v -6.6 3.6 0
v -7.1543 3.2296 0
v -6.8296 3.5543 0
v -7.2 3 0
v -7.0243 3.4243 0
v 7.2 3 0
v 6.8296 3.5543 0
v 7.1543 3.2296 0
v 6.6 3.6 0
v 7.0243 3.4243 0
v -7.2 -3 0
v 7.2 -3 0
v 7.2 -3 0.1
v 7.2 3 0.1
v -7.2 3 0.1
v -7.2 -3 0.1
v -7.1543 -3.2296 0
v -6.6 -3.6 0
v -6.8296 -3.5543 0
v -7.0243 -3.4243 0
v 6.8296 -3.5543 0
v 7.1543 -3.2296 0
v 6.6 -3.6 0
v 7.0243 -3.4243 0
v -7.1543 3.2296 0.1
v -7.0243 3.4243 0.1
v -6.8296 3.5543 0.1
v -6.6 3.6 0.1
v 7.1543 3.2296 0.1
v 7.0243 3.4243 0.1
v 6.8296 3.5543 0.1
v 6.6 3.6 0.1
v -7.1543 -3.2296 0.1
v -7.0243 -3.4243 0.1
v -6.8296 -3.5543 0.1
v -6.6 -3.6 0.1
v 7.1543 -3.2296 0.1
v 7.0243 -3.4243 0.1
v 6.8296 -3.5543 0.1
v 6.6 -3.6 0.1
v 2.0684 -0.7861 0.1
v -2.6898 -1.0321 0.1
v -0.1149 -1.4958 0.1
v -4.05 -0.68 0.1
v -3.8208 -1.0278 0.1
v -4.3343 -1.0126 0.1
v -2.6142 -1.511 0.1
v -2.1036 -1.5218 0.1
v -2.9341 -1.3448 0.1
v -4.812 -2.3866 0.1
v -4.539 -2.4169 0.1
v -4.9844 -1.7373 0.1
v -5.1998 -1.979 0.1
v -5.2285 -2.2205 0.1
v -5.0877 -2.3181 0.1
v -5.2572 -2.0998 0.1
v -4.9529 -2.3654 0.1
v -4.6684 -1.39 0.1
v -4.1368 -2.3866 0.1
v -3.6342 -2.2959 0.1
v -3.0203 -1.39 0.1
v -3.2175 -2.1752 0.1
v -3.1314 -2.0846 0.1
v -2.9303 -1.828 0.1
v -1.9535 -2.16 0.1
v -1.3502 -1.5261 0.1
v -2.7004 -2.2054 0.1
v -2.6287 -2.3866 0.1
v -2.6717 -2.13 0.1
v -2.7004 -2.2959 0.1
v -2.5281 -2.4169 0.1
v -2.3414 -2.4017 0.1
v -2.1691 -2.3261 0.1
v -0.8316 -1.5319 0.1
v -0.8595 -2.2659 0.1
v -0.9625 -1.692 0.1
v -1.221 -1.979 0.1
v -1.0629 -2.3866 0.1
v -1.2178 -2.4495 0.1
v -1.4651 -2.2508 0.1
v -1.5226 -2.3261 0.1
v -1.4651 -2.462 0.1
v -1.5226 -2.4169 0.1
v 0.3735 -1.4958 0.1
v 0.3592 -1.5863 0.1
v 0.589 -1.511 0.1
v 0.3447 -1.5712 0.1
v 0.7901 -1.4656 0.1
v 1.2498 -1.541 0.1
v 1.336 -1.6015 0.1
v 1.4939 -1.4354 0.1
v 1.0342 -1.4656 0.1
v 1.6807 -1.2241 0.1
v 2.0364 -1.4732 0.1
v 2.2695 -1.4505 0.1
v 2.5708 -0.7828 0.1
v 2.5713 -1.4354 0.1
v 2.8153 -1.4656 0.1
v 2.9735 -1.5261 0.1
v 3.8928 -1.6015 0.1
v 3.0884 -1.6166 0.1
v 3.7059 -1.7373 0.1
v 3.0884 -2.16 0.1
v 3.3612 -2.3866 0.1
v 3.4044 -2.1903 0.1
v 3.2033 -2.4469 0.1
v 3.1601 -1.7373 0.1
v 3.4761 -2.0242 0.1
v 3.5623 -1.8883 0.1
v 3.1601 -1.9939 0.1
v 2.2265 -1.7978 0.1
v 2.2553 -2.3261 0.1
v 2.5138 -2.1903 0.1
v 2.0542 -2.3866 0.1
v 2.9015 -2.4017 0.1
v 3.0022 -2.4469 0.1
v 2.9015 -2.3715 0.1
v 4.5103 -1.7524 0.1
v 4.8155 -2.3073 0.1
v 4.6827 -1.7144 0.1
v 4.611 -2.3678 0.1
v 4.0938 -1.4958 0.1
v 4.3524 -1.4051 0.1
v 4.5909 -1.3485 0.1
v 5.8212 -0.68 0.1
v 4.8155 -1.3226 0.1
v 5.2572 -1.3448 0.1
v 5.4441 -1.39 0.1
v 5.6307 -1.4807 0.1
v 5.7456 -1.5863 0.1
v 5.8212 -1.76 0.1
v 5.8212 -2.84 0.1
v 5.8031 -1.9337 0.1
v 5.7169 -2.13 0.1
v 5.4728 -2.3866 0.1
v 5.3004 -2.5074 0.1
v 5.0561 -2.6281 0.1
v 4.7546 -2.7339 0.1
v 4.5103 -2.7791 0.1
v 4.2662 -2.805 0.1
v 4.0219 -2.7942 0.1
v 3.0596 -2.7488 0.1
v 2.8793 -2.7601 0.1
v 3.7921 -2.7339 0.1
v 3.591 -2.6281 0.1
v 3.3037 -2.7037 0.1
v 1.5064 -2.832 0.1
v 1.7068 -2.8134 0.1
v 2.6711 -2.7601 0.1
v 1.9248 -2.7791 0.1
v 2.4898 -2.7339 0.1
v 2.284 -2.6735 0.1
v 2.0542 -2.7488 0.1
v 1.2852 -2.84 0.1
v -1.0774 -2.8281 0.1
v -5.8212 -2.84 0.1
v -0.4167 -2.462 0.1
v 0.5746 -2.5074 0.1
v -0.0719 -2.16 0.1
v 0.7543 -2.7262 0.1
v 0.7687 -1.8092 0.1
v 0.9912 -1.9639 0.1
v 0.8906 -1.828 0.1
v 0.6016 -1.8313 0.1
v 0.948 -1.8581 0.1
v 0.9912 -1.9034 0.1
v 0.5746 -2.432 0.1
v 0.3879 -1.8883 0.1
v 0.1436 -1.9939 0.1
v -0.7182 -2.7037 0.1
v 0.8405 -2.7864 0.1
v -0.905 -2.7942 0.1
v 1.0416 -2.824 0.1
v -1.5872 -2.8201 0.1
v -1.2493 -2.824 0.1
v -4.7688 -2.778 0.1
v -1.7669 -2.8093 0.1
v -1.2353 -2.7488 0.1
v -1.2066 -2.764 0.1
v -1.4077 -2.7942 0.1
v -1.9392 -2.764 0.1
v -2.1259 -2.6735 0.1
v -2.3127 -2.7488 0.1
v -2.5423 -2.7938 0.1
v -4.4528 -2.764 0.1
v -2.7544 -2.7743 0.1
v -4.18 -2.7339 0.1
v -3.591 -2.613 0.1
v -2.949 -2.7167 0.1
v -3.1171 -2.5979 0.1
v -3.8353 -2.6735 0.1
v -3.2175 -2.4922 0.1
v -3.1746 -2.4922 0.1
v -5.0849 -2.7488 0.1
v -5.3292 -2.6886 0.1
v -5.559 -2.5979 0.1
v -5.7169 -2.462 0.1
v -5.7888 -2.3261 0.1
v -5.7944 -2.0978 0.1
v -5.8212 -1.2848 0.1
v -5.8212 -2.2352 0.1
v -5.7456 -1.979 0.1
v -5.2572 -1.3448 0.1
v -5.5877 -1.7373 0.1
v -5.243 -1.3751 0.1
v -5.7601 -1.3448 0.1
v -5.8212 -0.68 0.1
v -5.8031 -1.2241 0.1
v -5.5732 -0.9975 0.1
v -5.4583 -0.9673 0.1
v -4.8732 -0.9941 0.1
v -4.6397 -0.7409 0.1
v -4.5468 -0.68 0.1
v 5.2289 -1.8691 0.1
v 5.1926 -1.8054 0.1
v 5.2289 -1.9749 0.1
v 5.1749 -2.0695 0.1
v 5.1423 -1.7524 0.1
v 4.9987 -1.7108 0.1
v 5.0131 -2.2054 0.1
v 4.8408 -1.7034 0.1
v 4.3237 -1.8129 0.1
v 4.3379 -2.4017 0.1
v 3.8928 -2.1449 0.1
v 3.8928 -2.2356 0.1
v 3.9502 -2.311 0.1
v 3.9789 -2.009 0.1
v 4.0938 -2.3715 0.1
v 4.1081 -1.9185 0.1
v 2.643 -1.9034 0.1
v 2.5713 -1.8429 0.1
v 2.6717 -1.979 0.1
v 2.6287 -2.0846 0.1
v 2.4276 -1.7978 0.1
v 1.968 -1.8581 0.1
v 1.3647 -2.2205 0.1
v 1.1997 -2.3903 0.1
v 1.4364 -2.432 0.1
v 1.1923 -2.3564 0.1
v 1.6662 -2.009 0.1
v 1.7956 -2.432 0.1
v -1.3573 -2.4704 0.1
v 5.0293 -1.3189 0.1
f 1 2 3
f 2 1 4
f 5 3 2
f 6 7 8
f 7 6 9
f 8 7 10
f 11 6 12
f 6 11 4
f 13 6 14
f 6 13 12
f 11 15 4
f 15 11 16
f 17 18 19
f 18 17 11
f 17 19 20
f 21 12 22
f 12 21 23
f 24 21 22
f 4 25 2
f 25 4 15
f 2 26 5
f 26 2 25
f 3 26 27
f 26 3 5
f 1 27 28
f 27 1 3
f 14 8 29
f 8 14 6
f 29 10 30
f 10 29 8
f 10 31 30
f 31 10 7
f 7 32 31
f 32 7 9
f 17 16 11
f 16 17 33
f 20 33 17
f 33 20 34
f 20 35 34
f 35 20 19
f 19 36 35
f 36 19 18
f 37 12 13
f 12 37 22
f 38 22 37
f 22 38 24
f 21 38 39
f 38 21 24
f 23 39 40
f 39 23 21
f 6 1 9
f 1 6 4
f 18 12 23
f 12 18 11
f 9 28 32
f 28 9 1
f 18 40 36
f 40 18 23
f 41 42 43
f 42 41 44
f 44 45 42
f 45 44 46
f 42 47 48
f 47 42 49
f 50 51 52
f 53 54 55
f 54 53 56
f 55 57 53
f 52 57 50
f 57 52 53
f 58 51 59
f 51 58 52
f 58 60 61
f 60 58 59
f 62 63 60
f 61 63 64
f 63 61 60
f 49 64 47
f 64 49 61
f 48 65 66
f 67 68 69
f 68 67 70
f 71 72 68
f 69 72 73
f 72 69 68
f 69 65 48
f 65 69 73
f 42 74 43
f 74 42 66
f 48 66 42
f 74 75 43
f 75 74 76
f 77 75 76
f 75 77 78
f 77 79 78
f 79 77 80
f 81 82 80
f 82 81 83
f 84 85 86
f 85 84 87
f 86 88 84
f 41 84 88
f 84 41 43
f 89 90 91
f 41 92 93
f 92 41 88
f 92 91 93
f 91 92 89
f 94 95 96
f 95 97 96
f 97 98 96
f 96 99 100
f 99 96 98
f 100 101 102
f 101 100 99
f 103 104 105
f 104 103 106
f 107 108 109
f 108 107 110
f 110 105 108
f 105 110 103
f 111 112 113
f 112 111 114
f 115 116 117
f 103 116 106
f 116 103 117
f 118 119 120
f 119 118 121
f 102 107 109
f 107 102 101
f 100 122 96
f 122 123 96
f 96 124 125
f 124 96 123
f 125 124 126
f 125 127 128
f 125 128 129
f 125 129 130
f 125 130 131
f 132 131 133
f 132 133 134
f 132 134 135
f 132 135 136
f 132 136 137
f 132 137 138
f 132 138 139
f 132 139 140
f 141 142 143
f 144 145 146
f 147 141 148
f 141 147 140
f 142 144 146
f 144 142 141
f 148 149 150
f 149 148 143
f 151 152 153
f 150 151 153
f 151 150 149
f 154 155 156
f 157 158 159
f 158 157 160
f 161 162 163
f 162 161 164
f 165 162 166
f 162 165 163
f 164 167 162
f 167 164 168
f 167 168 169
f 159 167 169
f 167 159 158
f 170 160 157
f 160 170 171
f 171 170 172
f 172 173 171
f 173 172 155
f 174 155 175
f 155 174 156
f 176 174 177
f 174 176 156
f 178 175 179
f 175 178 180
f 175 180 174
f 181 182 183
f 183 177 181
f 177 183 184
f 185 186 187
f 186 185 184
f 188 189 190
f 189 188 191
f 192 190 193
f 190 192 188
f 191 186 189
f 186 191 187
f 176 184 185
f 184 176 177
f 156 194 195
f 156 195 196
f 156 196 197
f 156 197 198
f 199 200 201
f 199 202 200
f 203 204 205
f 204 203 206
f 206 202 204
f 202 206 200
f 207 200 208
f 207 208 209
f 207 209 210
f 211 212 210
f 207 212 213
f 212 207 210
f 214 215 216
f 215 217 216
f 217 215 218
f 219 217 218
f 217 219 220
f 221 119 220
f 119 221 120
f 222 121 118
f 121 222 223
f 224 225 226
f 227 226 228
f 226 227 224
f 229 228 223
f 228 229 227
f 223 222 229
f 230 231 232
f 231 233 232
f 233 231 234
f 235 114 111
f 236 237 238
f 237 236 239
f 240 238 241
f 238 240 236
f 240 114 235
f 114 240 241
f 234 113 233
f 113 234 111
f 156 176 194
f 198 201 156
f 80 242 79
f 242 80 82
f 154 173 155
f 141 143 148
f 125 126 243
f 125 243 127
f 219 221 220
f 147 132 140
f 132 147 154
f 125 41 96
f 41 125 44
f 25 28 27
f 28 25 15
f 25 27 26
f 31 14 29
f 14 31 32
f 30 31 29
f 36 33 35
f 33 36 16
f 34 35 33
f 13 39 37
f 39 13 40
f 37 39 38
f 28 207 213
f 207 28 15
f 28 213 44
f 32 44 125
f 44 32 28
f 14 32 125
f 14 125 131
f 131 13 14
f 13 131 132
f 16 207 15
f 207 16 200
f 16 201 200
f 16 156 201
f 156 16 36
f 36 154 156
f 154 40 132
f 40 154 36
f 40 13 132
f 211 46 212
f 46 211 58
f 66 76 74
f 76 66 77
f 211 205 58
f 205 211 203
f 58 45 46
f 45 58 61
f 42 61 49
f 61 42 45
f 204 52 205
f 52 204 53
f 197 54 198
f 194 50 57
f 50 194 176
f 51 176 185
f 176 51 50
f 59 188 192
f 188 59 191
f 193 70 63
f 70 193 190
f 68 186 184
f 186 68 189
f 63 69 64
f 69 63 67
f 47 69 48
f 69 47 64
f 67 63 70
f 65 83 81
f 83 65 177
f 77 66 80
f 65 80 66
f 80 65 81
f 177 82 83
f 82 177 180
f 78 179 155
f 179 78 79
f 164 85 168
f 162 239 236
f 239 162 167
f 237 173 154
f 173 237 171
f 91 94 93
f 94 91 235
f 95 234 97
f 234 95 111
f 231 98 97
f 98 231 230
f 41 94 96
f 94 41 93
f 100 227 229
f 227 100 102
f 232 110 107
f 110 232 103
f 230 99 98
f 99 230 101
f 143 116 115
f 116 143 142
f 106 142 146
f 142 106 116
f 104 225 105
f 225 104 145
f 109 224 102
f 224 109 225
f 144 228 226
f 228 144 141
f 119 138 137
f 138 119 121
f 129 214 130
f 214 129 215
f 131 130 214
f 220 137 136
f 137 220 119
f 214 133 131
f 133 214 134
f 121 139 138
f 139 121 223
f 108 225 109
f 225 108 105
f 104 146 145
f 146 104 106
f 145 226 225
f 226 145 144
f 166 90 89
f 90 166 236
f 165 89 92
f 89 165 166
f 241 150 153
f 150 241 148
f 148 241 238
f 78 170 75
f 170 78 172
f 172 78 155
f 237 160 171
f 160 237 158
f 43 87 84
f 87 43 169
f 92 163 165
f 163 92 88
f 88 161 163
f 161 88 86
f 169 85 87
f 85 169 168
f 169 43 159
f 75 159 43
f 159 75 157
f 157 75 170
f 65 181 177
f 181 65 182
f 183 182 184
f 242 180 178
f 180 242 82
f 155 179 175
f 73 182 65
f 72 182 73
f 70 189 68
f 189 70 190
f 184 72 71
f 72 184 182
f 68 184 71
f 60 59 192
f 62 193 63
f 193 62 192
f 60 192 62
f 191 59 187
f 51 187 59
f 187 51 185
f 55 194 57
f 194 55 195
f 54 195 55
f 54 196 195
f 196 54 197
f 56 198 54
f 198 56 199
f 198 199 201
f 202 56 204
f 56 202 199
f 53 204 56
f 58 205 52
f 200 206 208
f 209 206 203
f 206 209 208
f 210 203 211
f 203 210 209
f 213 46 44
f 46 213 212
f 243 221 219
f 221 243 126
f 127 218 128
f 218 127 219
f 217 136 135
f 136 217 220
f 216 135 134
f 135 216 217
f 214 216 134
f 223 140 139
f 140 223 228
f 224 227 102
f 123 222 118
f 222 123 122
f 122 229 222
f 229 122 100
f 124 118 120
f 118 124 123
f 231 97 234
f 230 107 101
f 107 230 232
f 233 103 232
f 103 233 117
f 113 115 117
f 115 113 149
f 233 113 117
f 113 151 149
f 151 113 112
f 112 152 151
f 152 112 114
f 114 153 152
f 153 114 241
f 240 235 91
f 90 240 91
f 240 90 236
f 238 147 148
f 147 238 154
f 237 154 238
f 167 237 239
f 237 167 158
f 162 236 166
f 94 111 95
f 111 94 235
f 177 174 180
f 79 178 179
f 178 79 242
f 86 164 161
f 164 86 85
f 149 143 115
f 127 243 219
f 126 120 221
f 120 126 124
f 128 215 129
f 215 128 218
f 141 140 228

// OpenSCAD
use <../lib.scad>
use <../p/logo-porsche-turbo-text.scad>
use <s/6221655xs01.scad>
use <s/stickerback009x018.scad>
function ldraw_lib__6221655x() = [
// 0 Sticker  0.9 x  1.8 with Black "turbo" on Green Background
// 0 Name: 6221655x.dat
// 0 Author: Massimo Maso [Sirio]
// 0 !LDRAW_ORG Part UPDATE 2026-05
// 0 !LICENSE Licensed under CC BY 4.0 : see CAreadme.txt
// 
// 0 BFC CERTIFY CCW
  [0,"BFC","CERTIFY"],
  [0,"BFC","CCW"],
// 
// 0 !KEYWORDS 3.0, 911 RSR, Bricklink 75888stk01, Brickowl 925236, Porsche
// 0 !KEYWORDS Rebrickable 37801, Set 75888, Speed Champions
// 
// 0 !HISTORY 2026-05-31 [OrionP] Official Update 2026-05
// 
// 0 // Stickerback
// 1 16 0 0 0 1 0 0 0 1 0 0 0 1 s\stickerback009x018.dat
  [1,16,0,0,0,1,0,0,0,1,0,0,0,1, ldraw_lib__s__stickerback009x018()],
// 0 // Subpart
// 1 27 0 -.25 0 1 0 0 0 1 0 0 0 1 s\6221655xs01.dat
  [1,27,0,-.25,0,1,0,0,0,1,0,0,0,1, ldraw_lib__s__6221655xs01()],
// 0 // Logo primitive
// 1 0 0 -.25 -4.4 .54 0 0 0 1 0 0 0 .54 logo-porsche-turbo-text.dat
  [1,0,0,-.25,-4.4,.54,0,0,0,1,0,0,0,.54, ldraw_lib__logo_porsche_turbo_text()],
];
module ldraw_lib__6221655x(step=0, col=false, unit=2/5, alt=false, line=0.2, solid=!$preview)
    makepoly(ldraw_lib__6221655x(), step=step, col=col, unit=unit, alt=alt, line=line, solid=solid);
ldraw_lib__6221655x(line=0.2);
